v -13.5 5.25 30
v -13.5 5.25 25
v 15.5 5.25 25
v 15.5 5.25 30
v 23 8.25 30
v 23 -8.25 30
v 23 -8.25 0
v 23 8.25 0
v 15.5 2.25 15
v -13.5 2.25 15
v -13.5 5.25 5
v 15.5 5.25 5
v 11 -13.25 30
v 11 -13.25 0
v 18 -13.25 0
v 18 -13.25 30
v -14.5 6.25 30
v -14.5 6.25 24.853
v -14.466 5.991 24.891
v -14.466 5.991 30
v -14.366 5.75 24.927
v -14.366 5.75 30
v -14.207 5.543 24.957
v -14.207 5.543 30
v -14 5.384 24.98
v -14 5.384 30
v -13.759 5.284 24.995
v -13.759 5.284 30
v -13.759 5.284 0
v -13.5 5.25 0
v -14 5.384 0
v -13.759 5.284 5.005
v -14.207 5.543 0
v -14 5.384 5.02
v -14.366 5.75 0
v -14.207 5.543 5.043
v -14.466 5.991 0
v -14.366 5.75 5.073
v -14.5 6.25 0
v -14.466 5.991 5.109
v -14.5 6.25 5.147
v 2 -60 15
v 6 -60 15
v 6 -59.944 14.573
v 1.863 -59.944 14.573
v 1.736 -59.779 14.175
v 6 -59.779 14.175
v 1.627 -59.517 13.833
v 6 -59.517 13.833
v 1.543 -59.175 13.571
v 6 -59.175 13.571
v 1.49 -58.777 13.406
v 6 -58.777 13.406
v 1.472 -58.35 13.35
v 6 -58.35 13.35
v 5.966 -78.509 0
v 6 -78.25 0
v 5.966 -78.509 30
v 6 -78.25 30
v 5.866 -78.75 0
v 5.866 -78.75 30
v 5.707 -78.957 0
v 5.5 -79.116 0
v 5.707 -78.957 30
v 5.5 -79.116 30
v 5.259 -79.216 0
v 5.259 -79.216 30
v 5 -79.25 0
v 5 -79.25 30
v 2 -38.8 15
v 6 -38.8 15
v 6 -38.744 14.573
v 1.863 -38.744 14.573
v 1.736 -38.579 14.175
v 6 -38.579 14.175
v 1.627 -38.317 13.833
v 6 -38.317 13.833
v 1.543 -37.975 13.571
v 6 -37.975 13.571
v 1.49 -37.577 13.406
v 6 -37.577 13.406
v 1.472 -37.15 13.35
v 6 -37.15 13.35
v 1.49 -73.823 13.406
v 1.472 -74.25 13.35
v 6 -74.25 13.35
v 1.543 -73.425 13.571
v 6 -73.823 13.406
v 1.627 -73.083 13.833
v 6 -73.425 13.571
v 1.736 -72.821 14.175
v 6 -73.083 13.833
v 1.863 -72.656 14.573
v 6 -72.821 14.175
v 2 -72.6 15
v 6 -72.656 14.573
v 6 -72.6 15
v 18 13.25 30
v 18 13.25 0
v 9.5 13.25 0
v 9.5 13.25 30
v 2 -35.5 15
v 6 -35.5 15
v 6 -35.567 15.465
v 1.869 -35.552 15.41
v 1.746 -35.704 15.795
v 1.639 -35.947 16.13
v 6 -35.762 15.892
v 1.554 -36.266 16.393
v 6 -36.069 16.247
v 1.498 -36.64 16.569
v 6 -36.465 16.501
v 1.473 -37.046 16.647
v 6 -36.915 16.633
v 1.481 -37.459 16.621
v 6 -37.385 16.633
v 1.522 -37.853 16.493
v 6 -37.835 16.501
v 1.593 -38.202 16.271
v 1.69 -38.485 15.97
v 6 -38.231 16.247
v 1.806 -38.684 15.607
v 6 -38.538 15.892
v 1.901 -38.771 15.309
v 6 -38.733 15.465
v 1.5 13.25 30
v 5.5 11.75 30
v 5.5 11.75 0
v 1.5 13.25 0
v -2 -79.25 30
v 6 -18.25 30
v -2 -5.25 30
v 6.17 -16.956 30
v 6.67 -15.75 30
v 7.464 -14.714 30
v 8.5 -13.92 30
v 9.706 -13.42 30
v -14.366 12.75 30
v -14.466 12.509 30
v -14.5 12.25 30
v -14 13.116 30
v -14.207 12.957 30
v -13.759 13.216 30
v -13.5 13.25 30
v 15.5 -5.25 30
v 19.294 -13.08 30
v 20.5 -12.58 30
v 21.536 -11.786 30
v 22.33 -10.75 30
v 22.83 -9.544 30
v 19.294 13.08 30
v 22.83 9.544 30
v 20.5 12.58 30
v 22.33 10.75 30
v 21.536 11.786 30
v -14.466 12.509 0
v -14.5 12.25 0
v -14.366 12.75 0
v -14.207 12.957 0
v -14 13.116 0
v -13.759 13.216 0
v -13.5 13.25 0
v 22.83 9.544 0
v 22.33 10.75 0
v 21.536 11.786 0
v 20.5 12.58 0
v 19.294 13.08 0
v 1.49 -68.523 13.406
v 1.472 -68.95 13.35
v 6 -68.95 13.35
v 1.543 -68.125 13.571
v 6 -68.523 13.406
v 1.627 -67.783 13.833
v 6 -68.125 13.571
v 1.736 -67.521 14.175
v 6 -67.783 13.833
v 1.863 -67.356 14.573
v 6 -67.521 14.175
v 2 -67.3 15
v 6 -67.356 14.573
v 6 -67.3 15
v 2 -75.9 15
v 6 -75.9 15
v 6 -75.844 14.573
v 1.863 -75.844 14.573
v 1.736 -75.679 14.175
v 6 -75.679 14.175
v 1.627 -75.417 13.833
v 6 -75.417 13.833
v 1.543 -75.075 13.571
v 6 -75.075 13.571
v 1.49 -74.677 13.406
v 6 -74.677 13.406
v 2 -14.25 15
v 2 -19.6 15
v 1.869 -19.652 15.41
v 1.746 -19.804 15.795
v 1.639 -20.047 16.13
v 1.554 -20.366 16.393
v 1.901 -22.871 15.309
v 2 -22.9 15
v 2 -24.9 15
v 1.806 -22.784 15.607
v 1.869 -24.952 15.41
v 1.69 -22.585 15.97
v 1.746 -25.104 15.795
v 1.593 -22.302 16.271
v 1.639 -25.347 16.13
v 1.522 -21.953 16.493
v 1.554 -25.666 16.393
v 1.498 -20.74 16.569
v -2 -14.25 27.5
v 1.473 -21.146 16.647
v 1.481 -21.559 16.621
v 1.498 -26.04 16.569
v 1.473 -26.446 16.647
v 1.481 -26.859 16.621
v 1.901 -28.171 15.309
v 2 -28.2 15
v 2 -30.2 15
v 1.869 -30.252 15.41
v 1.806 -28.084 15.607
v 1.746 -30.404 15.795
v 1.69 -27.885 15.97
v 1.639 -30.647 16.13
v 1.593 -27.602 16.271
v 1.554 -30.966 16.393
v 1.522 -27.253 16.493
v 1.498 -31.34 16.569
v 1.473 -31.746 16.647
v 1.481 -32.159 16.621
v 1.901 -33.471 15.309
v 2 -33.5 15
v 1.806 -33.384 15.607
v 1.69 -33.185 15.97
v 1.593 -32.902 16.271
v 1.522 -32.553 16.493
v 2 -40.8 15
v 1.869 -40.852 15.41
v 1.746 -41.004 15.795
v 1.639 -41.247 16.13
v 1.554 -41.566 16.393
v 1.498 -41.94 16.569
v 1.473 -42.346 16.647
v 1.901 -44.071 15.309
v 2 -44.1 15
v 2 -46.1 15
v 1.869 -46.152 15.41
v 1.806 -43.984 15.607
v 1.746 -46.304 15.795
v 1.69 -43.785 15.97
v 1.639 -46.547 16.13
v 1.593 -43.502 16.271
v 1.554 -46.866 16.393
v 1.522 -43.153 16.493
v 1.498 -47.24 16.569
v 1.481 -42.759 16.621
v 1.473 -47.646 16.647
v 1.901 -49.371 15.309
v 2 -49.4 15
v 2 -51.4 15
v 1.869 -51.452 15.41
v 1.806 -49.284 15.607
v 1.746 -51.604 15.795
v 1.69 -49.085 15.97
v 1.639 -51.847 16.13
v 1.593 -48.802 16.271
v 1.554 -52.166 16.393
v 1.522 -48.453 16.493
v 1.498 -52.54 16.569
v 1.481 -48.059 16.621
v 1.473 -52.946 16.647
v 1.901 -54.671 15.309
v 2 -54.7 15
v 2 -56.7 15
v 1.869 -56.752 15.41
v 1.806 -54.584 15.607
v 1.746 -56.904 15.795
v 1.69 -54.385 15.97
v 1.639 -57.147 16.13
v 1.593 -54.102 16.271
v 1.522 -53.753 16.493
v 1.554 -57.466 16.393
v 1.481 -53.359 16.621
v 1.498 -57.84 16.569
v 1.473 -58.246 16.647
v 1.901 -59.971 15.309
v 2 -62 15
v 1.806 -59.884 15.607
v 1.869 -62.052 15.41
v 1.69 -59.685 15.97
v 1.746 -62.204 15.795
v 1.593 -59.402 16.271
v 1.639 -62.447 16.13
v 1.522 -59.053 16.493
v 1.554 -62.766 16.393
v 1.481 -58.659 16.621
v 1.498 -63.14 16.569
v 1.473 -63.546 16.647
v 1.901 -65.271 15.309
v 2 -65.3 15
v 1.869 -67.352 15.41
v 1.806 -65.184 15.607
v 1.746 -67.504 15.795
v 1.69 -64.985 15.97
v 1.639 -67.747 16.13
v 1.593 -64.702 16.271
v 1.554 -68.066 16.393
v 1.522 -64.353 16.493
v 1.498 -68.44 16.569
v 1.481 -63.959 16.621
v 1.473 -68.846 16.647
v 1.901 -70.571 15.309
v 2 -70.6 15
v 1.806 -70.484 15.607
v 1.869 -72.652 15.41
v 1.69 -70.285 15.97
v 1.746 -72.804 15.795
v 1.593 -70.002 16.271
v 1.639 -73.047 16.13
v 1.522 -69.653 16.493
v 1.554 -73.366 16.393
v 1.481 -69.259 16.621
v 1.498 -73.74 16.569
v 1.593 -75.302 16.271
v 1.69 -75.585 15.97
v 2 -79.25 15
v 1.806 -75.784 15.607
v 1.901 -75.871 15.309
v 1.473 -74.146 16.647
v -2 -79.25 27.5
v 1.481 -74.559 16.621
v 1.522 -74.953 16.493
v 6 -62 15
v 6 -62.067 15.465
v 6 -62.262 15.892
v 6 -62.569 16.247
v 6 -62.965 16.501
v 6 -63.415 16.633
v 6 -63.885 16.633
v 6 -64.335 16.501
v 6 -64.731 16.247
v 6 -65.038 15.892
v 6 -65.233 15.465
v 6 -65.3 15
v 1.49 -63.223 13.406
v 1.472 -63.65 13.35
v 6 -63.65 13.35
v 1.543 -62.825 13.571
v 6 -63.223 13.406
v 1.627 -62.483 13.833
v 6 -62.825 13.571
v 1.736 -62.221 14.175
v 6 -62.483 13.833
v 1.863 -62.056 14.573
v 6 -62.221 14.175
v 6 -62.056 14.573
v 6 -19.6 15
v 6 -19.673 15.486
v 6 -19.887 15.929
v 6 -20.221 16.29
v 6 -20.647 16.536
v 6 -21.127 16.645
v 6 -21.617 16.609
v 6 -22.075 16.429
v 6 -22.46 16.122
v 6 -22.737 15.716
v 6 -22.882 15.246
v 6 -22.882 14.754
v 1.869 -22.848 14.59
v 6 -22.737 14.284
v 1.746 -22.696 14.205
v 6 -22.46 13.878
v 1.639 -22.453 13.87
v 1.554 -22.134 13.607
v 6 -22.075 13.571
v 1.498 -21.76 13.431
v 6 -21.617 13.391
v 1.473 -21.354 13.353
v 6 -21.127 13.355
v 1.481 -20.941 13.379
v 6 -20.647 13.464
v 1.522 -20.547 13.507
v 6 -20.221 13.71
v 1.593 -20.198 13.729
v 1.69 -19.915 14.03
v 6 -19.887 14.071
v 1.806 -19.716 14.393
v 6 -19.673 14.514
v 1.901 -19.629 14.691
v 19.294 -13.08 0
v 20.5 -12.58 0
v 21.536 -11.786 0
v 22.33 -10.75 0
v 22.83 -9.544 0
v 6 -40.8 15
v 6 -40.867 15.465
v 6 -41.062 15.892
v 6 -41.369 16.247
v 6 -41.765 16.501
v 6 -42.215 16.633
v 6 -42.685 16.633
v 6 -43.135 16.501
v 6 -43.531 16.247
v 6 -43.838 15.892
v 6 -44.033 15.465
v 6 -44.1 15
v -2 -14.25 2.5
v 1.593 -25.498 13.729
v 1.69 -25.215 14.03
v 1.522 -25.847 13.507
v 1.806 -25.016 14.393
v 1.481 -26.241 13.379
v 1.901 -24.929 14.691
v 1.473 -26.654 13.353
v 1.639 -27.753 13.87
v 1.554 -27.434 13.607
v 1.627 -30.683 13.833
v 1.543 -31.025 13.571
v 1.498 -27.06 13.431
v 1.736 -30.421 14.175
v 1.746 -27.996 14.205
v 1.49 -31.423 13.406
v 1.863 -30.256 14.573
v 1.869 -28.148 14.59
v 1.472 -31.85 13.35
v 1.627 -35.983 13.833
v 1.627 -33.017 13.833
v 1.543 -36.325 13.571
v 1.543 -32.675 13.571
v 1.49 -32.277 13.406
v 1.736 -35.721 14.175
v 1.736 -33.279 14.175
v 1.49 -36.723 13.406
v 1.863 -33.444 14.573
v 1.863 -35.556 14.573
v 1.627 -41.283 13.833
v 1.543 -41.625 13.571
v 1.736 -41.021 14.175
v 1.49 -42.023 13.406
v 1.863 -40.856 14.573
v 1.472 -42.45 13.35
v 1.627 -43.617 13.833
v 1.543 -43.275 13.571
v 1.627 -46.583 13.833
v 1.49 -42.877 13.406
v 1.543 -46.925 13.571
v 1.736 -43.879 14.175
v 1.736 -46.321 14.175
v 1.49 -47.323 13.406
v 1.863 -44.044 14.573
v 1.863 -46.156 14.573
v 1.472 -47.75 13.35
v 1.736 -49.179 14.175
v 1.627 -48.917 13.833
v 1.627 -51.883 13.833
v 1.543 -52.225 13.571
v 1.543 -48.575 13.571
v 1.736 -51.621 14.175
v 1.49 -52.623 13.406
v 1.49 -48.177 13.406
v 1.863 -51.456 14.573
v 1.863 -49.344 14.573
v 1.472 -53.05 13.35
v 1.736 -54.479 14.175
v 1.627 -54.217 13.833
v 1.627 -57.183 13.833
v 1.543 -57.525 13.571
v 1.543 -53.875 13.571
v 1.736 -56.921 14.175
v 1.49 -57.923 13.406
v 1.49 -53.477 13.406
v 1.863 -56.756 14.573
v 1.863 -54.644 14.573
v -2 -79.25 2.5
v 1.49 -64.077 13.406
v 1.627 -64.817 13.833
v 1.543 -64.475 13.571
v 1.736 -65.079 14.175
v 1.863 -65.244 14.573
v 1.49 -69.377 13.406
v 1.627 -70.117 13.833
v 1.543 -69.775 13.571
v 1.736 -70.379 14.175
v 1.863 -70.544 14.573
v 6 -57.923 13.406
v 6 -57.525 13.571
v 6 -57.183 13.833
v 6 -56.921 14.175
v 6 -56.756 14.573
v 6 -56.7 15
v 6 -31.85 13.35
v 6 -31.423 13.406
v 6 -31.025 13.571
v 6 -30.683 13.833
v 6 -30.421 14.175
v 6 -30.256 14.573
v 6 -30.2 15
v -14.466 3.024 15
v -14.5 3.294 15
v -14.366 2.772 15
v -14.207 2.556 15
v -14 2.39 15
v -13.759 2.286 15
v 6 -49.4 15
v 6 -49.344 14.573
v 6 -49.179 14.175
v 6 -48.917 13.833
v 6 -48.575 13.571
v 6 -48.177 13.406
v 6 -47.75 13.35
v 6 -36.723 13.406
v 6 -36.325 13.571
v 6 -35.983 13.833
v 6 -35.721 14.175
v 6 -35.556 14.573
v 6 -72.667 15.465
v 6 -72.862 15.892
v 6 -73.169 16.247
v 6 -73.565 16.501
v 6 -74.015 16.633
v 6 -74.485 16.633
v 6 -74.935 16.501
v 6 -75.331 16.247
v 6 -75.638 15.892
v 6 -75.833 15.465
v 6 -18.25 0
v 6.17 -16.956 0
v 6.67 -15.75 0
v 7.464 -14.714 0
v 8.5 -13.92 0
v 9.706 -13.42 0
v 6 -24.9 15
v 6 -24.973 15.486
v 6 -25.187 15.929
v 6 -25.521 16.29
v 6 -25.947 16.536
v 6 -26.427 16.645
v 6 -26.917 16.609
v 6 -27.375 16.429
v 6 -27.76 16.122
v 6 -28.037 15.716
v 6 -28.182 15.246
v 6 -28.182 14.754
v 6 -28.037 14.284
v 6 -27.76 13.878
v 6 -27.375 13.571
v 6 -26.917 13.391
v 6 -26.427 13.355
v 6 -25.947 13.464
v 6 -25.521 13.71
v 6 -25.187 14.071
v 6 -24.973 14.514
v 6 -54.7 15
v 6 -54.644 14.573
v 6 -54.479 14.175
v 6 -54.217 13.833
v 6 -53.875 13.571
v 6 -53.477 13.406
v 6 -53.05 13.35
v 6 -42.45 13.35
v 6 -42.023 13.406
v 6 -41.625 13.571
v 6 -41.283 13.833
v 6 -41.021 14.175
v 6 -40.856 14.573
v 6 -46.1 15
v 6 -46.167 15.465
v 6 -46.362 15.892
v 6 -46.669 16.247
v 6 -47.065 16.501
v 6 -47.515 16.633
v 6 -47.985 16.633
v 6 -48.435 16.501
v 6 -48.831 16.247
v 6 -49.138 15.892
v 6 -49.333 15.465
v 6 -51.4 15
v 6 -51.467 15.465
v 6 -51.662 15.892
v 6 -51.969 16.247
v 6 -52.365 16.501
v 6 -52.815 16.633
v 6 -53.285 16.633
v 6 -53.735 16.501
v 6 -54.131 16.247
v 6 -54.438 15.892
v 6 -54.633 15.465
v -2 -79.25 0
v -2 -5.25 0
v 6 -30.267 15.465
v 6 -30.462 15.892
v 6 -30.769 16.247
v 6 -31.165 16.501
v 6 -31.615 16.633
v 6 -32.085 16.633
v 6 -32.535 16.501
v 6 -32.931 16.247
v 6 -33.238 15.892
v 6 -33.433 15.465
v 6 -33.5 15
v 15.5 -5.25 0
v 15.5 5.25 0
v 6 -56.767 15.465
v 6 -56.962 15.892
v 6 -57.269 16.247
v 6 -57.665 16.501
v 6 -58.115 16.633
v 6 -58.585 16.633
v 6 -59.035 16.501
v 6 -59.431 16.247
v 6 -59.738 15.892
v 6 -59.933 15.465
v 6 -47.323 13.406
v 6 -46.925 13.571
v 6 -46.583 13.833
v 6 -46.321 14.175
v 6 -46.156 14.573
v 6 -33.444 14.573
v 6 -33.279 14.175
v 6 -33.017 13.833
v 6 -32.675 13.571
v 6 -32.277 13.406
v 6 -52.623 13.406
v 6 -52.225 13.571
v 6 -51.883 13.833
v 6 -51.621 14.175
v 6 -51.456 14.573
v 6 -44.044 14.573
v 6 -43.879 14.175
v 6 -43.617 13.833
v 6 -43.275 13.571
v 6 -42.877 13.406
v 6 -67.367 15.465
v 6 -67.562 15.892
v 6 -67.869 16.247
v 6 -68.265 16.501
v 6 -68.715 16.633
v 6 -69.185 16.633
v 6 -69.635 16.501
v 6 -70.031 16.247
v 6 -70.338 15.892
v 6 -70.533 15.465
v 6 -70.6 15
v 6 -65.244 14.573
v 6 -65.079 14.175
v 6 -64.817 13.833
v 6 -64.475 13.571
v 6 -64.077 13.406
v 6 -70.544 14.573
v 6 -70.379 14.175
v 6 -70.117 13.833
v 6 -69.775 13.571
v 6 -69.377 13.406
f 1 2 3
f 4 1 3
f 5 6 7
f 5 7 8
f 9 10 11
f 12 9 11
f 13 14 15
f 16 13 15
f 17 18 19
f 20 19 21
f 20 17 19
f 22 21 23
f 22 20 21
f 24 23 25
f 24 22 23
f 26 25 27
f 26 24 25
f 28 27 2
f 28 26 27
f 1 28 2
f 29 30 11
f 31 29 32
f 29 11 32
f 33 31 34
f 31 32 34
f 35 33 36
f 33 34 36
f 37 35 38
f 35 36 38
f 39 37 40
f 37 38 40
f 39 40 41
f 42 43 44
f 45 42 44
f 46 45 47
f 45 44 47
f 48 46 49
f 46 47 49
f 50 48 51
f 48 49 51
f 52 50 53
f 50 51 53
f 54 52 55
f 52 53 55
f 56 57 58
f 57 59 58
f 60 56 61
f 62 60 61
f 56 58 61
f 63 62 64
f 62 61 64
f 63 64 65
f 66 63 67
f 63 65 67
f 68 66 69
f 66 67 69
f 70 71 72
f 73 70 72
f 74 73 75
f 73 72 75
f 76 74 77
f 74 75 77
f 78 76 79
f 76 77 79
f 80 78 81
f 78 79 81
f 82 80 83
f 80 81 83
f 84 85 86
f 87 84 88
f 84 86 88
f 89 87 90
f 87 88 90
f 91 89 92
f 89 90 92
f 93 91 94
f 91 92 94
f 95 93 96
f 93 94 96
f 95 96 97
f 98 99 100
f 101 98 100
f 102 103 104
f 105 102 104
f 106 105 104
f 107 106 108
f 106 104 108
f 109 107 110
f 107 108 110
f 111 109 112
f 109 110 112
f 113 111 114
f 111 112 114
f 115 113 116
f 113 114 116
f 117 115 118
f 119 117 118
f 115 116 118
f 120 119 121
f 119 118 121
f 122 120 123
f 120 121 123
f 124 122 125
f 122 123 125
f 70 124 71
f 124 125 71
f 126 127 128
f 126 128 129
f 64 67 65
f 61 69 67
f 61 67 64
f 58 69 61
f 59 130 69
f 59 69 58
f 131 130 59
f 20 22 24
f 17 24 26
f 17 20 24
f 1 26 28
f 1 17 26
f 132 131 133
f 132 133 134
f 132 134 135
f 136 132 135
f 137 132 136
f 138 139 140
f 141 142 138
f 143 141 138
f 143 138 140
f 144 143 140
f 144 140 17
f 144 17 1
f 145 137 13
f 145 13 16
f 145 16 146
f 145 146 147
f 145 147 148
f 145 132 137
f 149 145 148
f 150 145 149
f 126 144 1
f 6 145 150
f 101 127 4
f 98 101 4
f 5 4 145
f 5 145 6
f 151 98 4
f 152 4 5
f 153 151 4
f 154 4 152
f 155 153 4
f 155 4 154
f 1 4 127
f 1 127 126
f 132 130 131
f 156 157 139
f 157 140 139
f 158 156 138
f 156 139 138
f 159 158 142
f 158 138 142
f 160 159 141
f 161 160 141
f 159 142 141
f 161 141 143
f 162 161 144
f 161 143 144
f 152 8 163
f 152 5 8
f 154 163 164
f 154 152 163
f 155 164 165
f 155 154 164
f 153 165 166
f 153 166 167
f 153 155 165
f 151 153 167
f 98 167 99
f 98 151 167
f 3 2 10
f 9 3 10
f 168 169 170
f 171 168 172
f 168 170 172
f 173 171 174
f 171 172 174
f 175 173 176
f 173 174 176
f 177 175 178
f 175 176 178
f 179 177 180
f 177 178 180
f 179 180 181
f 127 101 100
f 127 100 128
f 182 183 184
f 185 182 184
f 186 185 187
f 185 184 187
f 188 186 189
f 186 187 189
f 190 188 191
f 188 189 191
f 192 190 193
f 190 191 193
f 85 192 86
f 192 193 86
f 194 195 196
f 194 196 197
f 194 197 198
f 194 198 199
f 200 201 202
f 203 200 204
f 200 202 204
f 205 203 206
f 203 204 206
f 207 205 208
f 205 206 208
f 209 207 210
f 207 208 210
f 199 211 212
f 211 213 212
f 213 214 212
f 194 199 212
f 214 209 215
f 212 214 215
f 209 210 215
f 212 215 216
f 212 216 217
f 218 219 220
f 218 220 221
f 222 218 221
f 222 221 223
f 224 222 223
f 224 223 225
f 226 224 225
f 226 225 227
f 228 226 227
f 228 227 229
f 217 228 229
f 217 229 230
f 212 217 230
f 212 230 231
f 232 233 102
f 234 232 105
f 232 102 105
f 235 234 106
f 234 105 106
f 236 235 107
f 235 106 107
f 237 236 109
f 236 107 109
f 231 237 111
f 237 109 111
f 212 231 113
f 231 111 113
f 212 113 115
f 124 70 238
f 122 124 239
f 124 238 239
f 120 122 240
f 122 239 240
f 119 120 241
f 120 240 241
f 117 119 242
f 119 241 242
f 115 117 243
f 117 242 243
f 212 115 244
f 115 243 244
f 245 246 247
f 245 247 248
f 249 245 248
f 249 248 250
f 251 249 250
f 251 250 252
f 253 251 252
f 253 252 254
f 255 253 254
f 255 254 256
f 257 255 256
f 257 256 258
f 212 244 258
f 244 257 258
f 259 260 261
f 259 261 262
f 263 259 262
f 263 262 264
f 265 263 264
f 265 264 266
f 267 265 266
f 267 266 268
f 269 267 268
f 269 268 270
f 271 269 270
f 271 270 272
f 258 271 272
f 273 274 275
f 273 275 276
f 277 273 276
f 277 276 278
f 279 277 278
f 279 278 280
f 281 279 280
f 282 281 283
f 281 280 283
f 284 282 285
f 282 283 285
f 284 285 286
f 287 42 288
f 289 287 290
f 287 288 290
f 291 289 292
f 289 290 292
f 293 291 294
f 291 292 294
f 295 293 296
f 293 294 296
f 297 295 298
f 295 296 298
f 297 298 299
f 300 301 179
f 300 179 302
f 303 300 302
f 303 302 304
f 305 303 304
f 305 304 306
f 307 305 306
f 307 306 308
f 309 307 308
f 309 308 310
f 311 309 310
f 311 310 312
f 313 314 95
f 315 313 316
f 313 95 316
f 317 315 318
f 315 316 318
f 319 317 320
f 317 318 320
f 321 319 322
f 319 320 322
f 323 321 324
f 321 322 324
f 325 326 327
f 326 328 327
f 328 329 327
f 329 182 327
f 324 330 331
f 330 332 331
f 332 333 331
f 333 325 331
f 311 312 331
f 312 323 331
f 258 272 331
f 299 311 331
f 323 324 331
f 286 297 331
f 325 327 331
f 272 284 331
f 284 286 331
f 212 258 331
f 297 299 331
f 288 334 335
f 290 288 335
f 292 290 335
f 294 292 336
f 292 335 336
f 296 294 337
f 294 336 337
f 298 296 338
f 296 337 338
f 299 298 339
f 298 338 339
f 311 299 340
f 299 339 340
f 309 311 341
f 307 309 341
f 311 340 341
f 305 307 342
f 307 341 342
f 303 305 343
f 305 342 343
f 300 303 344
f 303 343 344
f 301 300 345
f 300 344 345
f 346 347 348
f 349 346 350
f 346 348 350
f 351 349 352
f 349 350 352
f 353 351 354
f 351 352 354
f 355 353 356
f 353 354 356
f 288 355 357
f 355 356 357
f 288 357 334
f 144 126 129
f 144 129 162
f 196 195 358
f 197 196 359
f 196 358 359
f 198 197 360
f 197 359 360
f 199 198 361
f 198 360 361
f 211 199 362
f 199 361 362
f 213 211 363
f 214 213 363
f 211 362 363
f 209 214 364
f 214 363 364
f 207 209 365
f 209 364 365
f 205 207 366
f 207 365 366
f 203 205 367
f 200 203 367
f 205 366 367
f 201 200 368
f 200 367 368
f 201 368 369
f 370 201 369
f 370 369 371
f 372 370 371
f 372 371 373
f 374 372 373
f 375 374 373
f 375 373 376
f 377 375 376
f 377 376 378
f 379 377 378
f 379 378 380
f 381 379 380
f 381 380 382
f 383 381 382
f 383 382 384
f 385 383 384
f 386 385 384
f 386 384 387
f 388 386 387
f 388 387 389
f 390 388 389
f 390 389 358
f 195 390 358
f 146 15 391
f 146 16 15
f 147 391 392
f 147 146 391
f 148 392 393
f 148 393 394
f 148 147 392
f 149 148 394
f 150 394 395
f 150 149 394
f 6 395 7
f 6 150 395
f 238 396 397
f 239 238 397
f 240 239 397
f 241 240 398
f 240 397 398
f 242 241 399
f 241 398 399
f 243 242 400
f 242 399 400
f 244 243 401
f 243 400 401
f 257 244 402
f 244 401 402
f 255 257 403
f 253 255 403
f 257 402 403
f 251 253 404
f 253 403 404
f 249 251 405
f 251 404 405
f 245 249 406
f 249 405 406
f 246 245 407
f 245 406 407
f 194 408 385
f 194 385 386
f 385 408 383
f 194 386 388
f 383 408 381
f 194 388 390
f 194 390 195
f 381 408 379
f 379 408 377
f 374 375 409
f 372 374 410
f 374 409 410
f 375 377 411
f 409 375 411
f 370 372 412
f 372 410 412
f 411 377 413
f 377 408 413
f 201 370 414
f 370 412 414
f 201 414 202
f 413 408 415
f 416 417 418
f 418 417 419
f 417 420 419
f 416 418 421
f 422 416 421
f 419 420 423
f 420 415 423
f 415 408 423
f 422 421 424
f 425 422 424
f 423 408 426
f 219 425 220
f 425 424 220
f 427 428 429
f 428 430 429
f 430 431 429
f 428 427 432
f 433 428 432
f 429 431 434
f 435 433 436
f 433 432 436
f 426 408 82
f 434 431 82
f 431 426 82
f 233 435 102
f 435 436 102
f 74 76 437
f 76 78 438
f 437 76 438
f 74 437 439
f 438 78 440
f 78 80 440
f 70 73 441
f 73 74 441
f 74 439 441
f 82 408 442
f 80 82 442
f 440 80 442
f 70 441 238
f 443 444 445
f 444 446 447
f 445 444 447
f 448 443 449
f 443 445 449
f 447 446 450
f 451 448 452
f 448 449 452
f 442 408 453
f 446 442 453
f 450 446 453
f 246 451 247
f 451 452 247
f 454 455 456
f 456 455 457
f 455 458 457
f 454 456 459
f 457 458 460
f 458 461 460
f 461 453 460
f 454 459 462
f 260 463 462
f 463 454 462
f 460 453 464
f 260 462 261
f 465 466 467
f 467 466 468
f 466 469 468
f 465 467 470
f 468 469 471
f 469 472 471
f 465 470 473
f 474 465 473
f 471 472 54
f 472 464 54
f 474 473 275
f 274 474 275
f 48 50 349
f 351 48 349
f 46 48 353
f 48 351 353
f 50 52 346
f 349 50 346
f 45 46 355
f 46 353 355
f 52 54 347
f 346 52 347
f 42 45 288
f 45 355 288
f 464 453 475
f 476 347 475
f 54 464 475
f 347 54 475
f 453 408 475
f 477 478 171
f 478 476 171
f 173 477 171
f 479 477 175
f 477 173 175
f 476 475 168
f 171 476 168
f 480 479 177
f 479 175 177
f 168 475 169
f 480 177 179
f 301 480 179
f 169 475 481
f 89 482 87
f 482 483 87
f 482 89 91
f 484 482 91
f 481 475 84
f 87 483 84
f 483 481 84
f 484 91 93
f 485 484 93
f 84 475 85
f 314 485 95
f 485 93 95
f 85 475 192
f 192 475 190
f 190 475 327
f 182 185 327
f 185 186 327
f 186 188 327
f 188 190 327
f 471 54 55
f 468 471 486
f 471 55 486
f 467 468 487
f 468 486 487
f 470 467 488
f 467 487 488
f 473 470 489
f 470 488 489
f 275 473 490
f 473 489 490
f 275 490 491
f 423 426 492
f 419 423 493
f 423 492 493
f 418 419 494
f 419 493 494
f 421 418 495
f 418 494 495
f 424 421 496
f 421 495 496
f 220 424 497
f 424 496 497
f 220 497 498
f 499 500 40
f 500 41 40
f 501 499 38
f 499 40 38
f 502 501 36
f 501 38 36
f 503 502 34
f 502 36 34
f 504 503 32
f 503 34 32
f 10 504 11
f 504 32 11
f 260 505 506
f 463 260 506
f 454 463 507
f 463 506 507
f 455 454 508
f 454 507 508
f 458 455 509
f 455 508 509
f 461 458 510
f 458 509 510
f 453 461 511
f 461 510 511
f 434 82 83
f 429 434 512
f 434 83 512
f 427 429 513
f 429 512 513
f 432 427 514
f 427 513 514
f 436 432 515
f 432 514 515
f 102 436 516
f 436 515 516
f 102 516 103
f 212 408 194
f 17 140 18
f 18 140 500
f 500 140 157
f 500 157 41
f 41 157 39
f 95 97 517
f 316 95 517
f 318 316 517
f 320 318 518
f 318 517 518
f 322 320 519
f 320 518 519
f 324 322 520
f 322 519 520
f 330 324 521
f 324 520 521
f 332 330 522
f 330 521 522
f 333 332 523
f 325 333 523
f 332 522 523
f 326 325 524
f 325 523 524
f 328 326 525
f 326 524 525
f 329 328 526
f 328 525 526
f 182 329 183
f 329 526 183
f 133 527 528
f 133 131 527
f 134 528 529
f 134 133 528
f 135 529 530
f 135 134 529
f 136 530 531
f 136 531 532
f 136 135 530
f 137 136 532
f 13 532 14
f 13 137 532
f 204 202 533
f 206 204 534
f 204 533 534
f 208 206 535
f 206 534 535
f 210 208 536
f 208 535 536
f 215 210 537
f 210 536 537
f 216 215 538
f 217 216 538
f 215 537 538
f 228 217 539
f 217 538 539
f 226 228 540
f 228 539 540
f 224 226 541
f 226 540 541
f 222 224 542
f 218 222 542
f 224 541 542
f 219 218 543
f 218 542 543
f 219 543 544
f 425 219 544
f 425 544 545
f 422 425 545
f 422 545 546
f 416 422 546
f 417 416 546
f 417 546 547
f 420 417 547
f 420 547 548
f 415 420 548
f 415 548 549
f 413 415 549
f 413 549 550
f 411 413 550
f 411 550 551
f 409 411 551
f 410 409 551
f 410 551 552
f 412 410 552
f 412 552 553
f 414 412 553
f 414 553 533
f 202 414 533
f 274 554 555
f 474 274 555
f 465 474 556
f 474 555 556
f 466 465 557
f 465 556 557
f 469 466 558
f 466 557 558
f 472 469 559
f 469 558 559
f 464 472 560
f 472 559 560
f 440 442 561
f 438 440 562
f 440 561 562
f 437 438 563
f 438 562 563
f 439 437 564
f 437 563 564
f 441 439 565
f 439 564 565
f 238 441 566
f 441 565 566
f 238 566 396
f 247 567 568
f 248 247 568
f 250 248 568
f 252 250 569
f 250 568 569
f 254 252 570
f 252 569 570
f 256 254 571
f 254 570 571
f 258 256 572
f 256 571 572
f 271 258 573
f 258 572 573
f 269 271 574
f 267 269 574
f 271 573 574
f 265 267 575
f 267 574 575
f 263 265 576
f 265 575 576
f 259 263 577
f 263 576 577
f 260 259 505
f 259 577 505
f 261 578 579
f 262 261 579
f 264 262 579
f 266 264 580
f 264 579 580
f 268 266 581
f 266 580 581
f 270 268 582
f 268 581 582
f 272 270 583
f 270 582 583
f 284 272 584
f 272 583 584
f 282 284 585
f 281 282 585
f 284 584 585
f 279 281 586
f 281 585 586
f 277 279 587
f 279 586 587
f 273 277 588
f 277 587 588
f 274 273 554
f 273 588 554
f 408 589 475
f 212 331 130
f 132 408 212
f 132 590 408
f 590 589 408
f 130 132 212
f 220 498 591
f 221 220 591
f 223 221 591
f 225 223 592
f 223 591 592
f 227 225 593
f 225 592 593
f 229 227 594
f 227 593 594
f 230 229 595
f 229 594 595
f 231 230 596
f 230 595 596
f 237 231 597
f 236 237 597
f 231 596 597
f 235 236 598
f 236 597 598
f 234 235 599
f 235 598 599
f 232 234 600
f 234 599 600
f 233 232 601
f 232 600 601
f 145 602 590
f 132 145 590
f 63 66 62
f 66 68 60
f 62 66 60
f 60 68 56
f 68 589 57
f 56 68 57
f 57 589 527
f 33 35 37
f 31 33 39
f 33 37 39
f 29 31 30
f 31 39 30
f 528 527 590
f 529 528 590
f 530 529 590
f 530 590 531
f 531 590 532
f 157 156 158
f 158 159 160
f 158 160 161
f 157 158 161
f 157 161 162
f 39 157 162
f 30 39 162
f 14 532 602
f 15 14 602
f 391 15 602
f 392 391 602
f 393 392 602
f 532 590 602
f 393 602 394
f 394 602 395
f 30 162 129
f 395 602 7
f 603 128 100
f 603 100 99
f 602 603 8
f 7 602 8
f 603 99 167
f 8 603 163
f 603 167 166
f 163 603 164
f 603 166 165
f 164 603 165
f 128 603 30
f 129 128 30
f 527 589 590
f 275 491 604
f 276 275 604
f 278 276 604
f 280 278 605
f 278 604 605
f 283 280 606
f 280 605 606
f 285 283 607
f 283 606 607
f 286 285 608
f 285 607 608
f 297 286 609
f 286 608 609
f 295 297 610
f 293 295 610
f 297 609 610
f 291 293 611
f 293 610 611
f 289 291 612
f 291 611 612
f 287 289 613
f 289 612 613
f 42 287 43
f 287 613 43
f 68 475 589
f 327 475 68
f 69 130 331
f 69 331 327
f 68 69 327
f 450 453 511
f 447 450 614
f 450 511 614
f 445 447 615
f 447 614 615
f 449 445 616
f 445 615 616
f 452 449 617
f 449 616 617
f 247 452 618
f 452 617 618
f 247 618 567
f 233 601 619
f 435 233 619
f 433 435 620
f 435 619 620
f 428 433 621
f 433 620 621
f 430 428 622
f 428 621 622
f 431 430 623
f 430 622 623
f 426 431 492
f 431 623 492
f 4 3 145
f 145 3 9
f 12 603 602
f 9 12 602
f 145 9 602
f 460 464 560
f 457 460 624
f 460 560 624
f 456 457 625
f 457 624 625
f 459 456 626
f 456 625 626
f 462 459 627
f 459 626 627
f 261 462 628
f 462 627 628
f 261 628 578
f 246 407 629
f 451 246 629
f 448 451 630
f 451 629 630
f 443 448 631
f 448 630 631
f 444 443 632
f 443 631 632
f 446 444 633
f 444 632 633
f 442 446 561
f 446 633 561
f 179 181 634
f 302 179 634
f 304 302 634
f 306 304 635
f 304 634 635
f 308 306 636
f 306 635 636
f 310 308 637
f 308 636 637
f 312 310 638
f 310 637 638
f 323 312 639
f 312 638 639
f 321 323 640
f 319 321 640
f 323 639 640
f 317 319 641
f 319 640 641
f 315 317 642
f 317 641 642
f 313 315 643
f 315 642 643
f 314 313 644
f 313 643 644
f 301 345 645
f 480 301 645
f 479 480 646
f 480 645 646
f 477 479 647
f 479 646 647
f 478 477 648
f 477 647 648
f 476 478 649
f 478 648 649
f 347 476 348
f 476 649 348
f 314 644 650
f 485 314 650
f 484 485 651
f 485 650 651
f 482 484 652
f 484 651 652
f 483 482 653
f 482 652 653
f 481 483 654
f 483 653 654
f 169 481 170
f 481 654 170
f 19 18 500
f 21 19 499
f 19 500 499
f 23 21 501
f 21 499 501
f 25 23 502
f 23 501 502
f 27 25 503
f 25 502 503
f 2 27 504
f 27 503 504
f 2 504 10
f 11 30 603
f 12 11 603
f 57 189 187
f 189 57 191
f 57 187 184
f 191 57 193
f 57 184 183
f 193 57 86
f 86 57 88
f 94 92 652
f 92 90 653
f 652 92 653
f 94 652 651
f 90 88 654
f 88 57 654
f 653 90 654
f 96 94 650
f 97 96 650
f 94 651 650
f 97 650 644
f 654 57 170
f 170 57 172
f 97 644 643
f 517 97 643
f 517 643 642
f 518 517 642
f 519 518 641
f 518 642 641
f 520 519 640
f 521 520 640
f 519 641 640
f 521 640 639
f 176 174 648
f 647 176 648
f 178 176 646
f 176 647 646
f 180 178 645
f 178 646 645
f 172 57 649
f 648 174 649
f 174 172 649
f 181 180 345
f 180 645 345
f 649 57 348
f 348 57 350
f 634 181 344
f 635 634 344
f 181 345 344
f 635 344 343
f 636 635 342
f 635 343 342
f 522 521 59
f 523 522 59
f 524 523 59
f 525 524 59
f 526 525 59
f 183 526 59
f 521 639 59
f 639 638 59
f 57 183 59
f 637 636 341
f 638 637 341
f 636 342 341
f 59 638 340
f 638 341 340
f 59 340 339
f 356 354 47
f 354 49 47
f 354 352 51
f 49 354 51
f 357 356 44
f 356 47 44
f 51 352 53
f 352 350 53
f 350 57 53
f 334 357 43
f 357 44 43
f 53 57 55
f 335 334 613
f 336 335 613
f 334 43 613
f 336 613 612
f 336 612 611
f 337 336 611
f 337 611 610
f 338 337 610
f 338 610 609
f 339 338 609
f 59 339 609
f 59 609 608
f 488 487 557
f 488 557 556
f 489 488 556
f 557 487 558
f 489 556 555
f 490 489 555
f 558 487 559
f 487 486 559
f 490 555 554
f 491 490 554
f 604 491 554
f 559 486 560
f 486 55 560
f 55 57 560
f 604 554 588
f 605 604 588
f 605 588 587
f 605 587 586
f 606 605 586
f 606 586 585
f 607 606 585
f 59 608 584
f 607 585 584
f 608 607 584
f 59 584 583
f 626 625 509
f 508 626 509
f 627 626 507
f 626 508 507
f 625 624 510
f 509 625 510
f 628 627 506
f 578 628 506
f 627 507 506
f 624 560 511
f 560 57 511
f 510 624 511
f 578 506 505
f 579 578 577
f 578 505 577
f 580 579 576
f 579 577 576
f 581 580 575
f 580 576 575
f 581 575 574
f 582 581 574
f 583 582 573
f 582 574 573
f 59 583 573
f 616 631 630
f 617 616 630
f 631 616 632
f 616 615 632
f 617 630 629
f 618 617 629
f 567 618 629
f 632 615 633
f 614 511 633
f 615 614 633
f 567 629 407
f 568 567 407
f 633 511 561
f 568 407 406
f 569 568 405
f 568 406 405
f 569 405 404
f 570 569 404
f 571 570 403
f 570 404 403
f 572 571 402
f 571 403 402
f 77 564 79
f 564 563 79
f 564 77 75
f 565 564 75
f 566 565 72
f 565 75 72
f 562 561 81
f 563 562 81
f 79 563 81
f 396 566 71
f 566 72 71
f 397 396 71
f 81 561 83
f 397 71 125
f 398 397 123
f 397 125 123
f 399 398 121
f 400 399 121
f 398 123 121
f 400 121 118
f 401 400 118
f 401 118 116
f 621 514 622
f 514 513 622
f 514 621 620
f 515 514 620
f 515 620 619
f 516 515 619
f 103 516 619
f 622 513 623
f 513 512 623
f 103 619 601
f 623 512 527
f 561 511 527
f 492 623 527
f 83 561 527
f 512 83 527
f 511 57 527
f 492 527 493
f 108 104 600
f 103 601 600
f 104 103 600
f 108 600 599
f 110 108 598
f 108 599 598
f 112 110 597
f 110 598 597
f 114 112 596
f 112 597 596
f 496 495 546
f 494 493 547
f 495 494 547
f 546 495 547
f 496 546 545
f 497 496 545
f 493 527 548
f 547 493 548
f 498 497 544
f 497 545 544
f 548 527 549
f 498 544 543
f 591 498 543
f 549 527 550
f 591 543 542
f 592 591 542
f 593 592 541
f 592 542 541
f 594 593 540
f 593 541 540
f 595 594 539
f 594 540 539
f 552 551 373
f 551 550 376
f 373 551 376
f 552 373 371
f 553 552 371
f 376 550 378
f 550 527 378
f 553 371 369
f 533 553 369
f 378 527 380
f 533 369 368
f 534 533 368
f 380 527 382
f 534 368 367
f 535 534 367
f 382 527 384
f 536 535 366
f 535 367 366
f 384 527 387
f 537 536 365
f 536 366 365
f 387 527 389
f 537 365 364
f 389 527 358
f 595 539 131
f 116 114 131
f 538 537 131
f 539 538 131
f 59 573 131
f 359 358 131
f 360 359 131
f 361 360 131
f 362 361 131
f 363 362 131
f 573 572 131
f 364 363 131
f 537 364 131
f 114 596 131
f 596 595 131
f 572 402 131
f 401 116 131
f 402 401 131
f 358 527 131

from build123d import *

# Parameters (mm, degrees)
BOSS_EXTRUDE1_DEPTH = 30
CUT_EXTRUDE1_DEPTH  = 30
BOSS_EXTRUDE3_DEPTH = 30
SKETCH5_W           = 8
SKETCH5_H           = 30
BOSS_EXTRUDE4_DEPTH = 50
SKETCH6_R           = 1.65
CUT_EXTRUDE2_DEPTH  = 40
CUT_EXTRUDE3_DEPTH  = 65
FILLET1_R           = 5
FILLET3_R           = 1
FILLET4_R           = 1


with BuildPart() as part:
    # Sketch1 → Boss-Extrude1 (new body)
    with BuildSketch(Plane.XY):
        Polygon((-14.5, 13.25), (-14.5, 5.25), (15, 5.25), (15.5, 5.25), (15.5, -5.25), (15, -5.25), (-2, -5.25), (-2, -8.570490336), (-2, -29.25), (6, -29.25), (6, -13.25), (23, -13.25), (23, 13.25), align=None)
    extrude(amount=BOSS_EXTRUDE1_DEPTH)

    # Sketch3 → Cut-Extrude1 (cut)
    with BuildSketch(Plane.XY.offset(30)):
        Polygon((1.5, 13.25), (9.5, 13.25), (5.5, 11.75), align=None)
    extrude(amount=-CUT_EXTRUDE1_DEPTH, mode=Mode.SUBTRACT)

    # Sketch4 → Boss-Extrude3 (add)
    with BuildSketch(Plane.ZY.offset(14.5)):
        Polygon((5, 5.25), (25, 5.25), (15, 2.25), align=None)
    extrude(amount=-BOSS_EXTRUDE3_DEPTH)

    # Sketch5 → Boss-Extrude4 (add)
    with BuildSketch(Plane.XZ.offset(29.25)):
        with Locations((2, 15)):
            Rectangle(SKETCH5_W, SKETCH5_H)
    extrude(amount=BOSS_EXTRUDE4_DEPTH)

    # Sketch6 → Cut-Extrude2 (cut)
    with BuildSketch(Plane(origin=(6, 0, 0), x_dir=(0, 0, -1), z_dir=(1, 0, 0))):
        with BuildLine():
            ThreePointArc((-13.35, -31.85), (-13.833273811, -30.683273811), (-15, -30.2))
            Line((-15, -30.2), (-15, -33.5))
            ThreePointArc((-15, -33.5), (-13.833273811, -33.016726189), (-13.35, -31.85))
        make_face()
        with BuildLine():
            Line((-15, -33.5), (-15, -30.2))
            ThreePointArc((-15, -30.2), (-16.65, -31.85), (-15, -33.5))
        make_face()
        with BuildLine():
            ThreePointArc((-13.35, -37.15), (-13.833273811, -35.983273811), (-15, -35.5))
            Line((-15, -35.5), (-15, -38.8))
            ThreePointArc((-15, -38.8), (-13.833273811, -38.316726189), (-13.35, -37.15))
        make_face()
        with BuildLine():
            Line((-15, -38.8), (-15, -35.5))
            ThreePointArc((-15, -35.5), (-16.65, -37.15), (-15, -38.8))
        make_face()
        with BuildLine():
            ThreePointArc((-13.35, -42.45), (-13.833273811, -41.283273811), (-15, -40.8))
            Line((-15, -40.8), (-15, -44.1))
            ThreePointArc((-15, -44.1), (-13.833273811, -43.616726189), (-13.35, -42.45))
        make_face()
        with BuildLine():
            Line((-15, -44.1), (-15, -40.8))
            ThreePointArc((-15, -40.8), (-16.65, -42.45), (-15, -44.1))
        make_face()
        with BuildLine():
            ThreePointArc((-13.35, -47.75), (-13.833273811, -46.583273811), (-15, -46.1))
            Line((-15, -46.1), (-15, -49.4))
            ThreePointArc((-15, -49.4), (-13.833273811, -48.916726189), (-13.35, -47.75))
        make_face()
        with BuildLine():
            Line((-15, -49.4), (-15, -46.1))
            ThreePointArc((-15, -46.1), (-16.65, -47.75), (-15, -49.4))
        make_face()
        with BuildLine():
            ThreePointArc((-13.35, -53.05), (-13.833273811, -51.883273811), (-15, -51.4))
            Line((-15, -51.4), (-15, -54.7))
            ThreePointArc((-15, -54.7), (-13.833273811, -54.216726189), (-13.35, -53.05))
        make_face()
        with BuildLine():
            Line((-15, -54.7), (-15, -51.4))
            ThreePointArc((-15, -51.4), (-16.65, -53.05), (-15, -54.7))
        make_face()
        with BuildLine():
            ThreePointArc((-13.35, -58.35), (-13.833273811, -57.183273811), (-15, -56.7))
            Line((-15, -56.7), (-15, -60))
            ThreePointArc((-15, -60), (-13.833273811, -59.516726189), (-13.35, -58.35))
        make_face()
        with BuildLine():
            Line((-15, -60), (-15, -56.7))
            ThreePointArc((-15, -56.7), (-16.65, -58.35), (-15, -60))
        make_face()
        with BuildLine():
            ThreePointArc((-13.35, -63.65), (-13.833273811, -62.483273811), (-15, -62))
            Line((-15, -62), (-15, -65.3))
            ThreePointArc((-15, -65.3), (-13.833273811, -64.816726189), (-13.35, -63.65))
        make_face()
        with BuildLine():
            Line((-15, -65.3), (-15, -62))
            ThreePointArc((-15, -62), (-16.65, -63.65), (-15, -65.3))
        make_face()
        with BuildLine():
            ThreePointArc((-13.35, -68.95), (-13.833273811, -67.783273811), (-15, -67.3))
            Line((-15, -67.3), (-15, -70.6))
            ThreePointArc((-15, -70.6), (-13.833273811, -70.116726189), (-13.35, -68.95))
        make_face()
        with BuildLine():
            Line((-15, -70.6), (-15, -67.3))
            ThreePointArc((-15, -67.3), (-16.65, -68.95), (-15, -70.6))
        make_face()
        with BuildLine():
            ThreePointArc((-13.35, -74.25), (-13.833273811, -73.083273811), (-15, -72.6))
            Line((-15, -72.6), (-15, -75.9))
            ThreePointArc((-15, -75.9), (-13.833273811, -75.416726189), (-13.35, -74.25))
        make_face()
        with BuildLine():
            Line((-15, -75.9), (-15, -72.6))
            ThreePointArc((-15, -72.6), (-16.65, -74.25), (-15, -75.9))
        make_face()
        with Locations(Location((-15, -26.55, 0), (0, 0, 90))):
            Circle(SKETCH6_R)
        with Locations(Location((-15, -21.25, 0), (0, 0, 90))):
            Circle(SKETCH6_R)
    extrude(amount=-CUT_EXTRUDE2_DEPTH, mode=Mode.SUBTRACT)

    # Sketch7 → Cut-Extrude3 (cut)
    with BuildSketch(Plane.XZ.offset(79.25)):
        Polygon((-2, 27.5), (-2, 2.5), (2, 15), align=None)
    extrude(amount=-CUT_EXTRUDE3_DEPTH, mode=Mode.SUBTRACT)

    # Fillet1
    fillet1_edges = [part.edges().sort_by_distance(p)[0] for p in [
        (23, 13.25, 15),
        (23, -13.25, 15),
        (6, -13.25, 15),
    ]]
    fillet(fillet1_edges, radius=FILLET1_R)

    # Fillet3
    fillet3_edges = [part.edges().sort_by_distance(p)[0] for p in [
        (6, -79.25, 15),
    ]]
    fillet(fillet3_edges, radius=FILLET3_R)

    # Fillet4
    fillet4_edges = [part.edges().sort_by_distance(p)[0] for p in [
        (-14.5, 5.25, 27.5),
        (-14.5, 13.25, 15),
        (-14.5, 5.25, 2.5),
        (-14.5, 3.75, 20),
        (-14.5, 3.75, 10),
    ]]
    fillet(fillet4_edges, radius=FILLET4_R)


solid = part.part
